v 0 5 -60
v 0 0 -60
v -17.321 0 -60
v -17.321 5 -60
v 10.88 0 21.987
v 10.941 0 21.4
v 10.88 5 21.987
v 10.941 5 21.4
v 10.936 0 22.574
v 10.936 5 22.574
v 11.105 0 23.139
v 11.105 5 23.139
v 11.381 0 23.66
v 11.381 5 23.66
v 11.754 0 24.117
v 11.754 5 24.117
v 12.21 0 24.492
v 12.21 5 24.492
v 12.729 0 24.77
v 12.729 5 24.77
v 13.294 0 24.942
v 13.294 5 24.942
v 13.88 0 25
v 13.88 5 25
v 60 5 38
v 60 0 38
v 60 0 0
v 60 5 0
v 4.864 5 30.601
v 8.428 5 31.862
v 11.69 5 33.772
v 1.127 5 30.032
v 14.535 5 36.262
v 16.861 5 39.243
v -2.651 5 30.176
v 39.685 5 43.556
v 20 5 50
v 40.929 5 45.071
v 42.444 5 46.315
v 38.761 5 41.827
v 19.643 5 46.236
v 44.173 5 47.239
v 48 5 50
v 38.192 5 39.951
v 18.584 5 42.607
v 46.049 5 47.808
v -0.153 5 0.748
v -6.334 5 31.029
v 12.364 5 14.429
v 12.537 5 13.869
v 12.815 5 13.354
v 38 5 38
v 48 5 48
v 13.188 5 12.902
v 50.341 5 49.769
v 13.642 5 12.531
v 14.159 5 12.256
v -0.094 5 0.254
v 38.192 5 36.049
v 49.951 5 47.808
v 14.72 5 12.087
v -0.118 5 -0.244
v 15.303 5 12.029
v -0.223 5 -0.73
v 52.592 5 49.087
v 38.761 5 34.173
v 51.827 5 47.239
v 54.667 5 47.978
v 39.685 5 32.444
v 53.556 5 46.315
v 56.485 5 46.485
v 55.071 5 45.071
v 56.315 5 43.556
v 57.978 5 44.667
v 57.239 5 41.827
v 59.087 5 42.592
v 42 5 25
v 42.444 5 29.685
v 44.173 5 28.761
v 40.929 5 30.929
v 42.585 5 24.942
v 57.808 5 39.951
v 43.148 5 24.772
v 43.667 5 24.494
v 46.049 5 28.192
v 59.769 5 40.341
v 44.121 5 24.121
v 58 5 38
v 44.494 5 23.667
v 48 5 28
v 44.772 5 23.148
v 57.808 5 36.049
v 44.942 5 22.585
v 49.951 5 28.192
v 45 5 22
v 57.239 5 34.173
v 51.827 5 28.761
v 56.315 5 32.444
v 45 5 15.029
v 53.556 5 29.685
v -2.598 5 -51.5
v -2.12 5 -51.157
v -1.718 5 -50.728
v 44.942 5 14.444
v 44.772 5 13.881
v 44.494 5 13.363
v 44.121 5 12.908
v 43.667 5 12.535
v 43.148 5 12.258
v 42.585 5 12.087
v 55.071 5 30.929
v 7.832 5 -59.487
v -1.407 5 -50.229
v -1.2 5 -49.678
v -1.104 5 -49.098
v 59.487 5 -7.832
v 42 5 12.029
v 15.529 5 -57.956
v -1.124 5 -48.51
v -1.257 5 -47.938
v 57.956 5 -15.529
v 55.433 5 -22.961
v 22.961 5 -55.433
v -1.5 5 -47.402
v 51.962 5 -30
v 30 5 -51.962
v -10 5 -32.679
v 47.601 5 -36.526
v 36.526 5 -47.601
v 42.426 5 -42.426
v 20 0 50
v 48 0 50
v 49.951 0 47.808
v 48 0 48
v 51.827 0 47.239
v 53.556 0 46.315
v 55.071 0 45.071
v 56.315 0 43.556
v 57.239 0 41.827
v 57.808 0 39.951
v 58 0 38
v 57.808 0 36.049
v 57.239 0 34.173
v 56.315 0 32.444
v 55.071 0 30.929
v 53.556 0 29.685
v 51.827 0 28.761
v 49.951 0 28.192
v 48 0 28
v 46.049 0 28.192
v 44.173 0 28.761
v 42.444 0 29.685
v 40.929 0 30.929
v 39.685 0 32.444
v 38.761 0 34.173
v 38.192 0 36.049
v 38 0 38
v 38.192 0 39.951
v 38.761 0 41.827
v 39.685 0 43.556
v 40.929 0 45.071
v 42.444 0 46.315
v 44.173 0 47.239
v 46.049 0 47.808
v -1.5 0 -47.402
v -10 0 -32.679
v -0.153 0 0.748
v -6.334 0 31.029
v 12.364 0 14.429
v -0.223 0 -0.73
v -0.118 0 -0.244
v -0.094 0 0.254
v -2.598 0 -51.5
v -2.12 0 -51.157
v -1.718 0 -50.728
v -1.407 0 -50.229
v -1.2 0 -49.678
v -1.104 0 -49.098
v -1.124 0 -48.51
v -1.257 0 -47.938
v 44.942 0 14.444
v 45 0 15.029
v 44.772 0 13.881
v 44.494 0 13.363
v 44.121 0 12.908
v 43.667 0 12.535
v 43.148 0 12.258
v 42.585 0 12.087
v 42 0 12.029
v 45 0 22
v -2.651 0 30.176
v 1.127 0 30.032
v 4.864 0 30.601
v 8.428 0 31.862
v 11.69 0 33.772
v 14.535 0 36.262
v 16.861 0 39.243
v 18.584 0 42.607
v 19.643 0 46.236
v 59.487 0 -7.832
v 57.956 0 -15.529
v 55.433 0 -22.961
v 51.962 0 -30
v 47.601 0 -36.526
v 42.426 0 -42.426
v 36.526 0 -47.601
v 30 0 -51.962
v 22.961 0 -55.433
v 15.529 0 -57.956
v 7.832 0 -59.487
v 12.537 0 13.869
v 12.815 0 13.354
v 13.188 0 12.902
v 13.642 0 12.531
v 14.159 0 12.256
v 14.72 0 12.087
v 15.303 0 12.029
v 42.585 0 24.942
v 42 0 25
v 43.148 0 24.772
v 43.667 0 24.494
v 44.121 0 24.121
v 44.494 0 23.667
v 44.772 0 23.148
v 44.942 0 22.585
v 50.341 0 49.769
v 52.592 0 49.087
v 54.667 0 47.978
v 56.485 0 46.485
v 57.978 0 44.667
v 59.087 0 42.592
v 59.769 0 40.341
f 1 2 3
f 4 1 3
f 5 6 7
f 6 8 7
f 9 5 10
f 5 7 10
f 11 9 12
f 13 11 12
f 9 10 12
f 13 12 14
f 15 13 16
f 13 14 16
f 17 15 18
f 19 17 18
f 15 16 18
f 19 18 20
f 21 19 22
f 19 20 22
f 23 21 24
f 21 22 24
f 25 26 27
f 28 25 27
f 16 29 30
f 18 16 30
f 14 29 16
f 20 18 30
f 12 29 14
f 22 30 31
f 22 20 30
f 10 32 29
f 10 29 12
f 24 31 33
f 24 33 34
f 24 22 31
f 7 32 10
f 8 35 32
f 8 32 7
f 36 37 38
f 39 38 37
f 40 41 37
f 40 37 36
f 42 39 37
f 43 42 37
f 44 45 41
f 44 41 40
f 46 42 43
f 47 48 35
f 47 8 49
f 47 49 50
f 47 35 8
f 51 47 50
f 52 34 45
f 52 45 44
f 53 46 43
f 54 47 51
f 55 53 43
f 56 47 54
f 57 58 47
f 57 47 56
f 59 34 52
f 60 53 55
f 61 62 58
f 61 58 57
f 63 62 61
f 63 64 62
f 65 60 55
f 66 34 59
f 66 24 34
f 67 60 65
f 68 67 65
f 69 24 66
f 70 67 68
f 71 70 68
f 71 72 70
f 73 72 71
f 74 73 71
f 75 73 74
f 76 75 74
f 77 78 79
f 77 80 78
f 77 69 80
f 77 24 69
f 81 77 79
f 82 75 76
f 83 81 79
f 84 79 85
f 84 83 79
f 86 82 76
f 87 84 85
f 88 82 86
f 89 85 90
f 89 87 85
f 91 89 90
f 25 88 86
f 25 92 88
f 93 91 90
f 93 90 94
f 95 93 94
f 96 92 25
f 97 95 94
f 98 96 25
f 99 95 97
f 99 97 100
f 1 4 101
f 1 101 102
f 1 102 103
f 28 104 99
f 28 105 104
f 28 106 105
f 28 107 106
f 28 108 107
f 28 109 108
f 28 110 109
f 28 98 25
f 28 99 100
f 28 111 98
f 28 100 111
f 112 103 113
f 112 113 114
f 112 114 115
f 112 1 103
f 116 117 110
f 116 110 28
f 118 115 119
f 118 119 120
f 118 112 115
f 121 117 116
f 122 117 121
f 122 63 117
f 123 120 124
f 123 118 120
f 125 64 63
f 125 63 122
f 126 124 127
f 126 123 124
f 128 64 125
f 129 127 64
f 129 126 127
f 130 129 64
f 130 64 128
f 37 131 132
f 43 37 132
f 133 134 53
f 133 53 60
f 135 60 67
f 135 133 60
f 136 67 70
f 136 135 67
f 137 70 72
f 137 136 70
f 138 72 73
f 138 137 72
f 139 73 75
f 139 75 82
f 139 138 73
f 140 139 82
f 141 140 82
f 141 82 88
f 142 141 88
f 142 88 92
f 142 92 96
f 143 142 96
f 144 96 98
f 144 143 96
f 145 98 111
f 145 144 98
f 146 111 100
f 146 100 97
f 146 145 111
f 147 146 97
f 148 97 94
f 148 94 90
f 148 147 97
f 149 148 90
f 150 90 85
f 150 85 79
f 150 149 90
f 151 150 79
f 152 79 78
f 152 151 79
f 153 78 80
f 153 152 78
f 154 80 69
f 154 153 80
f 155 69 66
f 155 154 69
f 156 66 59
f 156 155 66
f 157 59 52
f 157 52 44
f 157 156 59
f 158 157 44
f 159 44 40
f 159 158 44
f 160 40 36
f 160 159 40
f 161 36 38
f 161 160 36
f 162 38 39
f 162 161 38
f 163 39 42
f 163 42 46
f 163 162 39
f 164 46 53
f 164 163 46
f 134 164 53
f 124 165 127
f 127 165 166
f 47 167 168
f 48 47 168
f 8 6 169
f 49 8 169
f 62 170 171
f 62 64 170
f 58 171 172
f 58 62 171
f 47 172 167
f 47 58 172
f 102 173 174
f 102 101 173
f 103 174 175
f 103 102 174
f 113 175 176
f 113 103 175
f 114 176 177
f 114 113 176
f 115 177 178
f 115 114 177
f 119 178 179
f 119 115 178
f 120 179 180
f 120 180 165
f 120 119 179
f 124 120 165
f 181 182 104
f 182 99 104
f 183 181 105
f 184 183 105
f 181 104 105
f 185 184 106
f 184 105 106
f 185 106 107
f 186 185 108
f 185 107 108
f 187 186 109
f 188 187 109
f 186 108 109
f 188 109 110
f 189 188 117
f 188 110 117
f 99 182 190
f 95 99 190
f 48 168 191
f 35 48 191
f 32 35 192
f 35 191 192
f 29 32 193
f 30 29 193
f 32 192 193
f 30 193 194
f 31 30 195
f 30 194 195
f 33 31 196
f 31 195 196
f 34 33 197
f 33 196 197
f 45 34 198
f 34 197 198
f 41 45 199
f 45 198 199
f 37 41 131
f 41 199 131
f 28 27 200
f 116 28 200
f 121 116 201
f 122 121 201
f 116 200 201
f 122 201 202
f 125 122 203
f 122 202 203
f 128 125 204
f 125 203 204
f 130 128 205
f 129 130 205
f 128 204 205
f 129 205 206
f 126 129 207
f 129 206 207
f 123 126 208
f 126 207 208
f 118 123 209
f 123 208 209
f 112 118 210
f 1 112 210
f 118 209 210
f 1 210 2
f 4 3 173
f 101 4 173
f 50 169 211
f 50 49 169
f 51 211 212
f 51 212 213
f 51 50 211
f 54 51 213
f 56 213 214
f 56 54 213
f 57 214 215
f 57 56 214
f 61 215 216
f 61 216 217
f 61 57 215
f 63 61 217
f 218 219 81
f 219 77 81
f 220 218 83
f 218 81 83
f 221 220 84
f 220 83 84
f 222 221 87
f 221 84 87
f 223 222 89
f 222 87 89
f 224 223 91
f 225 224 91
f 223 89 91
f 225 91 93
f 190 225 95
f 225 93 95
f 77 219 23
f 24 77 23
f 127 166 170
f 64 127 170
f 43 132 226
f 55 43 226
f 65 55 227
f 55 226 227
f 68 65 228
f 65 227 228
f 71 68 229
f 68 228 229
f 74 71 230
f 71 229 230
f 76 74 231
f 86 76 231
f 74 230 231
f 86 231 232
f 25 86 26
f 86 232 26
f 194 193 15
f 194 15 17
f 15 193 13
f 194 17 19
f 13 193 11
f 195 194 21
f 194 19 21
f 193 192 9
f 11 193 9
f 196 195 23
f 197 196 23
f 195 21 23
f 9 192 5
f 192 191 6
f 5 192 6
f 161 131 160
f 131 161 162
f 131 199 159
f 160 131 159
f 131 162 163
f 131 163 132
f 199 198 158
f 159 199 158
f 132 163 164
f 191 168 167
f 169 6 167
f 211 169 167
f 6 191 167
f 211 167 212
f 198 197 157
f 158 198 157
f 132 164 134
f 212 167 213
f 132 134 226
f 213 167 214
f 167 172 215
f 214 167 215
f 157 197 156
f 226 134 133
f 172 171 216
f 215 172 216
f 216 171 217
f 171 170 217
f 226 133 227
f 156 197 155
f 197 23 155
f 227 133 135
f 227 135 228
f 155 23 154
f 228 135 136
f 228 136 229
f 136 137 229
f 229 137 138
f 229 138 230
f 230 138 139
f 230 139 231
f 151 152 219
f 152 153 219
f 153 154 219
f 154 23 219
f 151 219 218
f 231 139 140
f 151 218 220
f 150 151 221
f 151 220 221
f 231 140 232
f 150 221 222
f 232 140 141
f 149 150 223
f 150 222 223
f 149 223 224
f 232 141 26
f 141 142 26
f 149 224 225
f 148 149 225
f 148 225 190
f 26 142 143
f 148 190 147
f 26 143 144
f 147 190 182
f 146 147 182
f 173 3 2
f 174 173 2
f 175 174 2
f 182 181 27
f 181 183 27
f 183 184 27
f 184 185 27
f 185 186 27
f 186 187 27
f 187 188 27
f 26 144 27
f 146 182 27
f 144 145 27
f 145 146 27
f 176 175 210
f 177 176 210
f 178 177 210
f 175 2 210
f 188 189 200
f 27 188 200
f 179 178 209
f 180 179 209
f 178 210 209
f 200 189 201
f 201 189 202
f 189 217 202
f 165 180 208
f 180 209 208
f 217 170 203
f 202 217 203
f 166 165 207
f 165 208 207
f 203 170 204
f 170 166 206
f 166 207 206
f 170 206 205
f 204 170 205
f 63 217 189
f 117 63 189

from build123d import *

# Parameters (mm, degrees)
PROFILE_SKETCH_R      = 10
PROFILE_EXTRUDE_DEPTH = 5
TRAPEZOID_FILLET_R    = 3
CLAW_FILLET_R         = 3


with BuildPart() as part:
    # Profile Sketch → Profile Extrude (new body)
    with BuildSketch(Plane(origin=(0, 0, 0), x_dir=(1, 0, 0), z_dir=(0, 1, 0))):
        with BuildLine():
            Line((0, 60), (-17.320508076, 60))
            Line((-17.320508076, 60), (0, 50))
            Line((0, 50), (-10, 32.679491924))
            Line((-10, 32.679491924), (0, 0))
            Line((0, 0), (-6.333857356, -31.029437252))
            ThreePointArc((-6.333857356, -31.029437252), (11.690227818, -33.772289947), (20, -50))
            Line((20, -50), (48, -50))
            ThreePointArc((48, -50), (56.485281374, -46.485281374), (60, -38))
            Line((60, -38), (60, 0))
            ThreePointArc((60, 0), (42.426406871, 42.426406871), (0, 60))
        make_face()
        with Locations(Location((48, -38, 0), (0, 0, 270))):
            Circle(PROFILE_SKETCH_R, mode=Mode.SUBTRACT)
        Polygon((12.853812296, -12.029437252), (45, -12.029437252), (45, -25), (10.206207262, -25), align=None, mode=Mode.SUBTRACT)
    extrude(amount=PROFILE_EXTRUDE_DEPTH)

    # Trapezoid Fillet
    trapezoid_fillet_edges = [part.edges().sort_by_distance(p)[0] for p in [
        (10.206207262, 2.5, 25),
        (45, 2.5, 25),
        (45, 2.5, 12.029437252),
        (12.853812296, 2.5, 12.029437252),
    ]]
    fillet(trapezoid_fillet_edges, radius=TRAPEZOID_FILLET_R)

    # Claw Fillet
    claw_fillet_edges = [part.edges().sort_by_distance(p)[0] for p in [
        (0, 2.5, -50),
        (0, 2.5, 0),
    ]]
    fillet(claw_fillet_edges, radius=CLAW_FILLET_R)


solid = part.part
